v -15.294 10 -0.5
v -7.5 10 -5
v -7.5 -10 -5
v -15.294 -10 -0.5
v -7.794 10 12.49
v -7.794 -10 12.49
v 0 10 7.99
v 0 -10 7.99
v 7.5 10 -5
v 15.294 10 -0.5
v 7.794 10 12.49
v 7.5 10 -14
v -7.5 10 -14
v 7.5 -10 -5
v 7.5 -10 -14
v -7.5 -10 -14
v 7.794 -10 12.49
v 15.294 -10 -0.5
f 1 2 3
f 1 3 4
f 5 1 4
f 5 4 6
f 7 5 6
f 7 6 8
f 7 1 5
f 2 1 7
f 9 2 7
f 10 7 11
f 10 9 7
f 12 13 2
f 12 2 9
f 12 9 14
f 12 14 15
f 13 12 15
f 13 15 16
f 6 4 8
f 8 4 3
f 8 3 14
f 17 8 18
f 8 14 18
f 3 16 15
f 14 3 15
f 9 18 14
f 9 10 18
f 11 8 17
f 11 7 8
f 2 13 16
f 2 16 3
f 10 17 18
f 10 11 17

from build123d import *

# Parameters (mm, degrees)
BOSS_EXTRUDE1_DEPTH = 10


with BuildPart() as part:
    # Sketch1 → Boss-Extrude1 (new, symmetric)
    with BuildSketch(Plane(origin=(0, 0, 0), x_dir=(1, 0, 0), z_dir=(0, 1, 0))):
        Polygon((15.294228634, 0.5), (7.5, 5), (7.5, 14), (-7.5, 14), (-7.5, 5), (-15.294228634, 0.5), (-7.794228634, -12.490381057), (0, -7.990381057), (7.794228634, -12.490381057), align=None)
    extrude(amount=BOSS_EXTRUDE1_DEPTH, both=True)


solid = part.part
